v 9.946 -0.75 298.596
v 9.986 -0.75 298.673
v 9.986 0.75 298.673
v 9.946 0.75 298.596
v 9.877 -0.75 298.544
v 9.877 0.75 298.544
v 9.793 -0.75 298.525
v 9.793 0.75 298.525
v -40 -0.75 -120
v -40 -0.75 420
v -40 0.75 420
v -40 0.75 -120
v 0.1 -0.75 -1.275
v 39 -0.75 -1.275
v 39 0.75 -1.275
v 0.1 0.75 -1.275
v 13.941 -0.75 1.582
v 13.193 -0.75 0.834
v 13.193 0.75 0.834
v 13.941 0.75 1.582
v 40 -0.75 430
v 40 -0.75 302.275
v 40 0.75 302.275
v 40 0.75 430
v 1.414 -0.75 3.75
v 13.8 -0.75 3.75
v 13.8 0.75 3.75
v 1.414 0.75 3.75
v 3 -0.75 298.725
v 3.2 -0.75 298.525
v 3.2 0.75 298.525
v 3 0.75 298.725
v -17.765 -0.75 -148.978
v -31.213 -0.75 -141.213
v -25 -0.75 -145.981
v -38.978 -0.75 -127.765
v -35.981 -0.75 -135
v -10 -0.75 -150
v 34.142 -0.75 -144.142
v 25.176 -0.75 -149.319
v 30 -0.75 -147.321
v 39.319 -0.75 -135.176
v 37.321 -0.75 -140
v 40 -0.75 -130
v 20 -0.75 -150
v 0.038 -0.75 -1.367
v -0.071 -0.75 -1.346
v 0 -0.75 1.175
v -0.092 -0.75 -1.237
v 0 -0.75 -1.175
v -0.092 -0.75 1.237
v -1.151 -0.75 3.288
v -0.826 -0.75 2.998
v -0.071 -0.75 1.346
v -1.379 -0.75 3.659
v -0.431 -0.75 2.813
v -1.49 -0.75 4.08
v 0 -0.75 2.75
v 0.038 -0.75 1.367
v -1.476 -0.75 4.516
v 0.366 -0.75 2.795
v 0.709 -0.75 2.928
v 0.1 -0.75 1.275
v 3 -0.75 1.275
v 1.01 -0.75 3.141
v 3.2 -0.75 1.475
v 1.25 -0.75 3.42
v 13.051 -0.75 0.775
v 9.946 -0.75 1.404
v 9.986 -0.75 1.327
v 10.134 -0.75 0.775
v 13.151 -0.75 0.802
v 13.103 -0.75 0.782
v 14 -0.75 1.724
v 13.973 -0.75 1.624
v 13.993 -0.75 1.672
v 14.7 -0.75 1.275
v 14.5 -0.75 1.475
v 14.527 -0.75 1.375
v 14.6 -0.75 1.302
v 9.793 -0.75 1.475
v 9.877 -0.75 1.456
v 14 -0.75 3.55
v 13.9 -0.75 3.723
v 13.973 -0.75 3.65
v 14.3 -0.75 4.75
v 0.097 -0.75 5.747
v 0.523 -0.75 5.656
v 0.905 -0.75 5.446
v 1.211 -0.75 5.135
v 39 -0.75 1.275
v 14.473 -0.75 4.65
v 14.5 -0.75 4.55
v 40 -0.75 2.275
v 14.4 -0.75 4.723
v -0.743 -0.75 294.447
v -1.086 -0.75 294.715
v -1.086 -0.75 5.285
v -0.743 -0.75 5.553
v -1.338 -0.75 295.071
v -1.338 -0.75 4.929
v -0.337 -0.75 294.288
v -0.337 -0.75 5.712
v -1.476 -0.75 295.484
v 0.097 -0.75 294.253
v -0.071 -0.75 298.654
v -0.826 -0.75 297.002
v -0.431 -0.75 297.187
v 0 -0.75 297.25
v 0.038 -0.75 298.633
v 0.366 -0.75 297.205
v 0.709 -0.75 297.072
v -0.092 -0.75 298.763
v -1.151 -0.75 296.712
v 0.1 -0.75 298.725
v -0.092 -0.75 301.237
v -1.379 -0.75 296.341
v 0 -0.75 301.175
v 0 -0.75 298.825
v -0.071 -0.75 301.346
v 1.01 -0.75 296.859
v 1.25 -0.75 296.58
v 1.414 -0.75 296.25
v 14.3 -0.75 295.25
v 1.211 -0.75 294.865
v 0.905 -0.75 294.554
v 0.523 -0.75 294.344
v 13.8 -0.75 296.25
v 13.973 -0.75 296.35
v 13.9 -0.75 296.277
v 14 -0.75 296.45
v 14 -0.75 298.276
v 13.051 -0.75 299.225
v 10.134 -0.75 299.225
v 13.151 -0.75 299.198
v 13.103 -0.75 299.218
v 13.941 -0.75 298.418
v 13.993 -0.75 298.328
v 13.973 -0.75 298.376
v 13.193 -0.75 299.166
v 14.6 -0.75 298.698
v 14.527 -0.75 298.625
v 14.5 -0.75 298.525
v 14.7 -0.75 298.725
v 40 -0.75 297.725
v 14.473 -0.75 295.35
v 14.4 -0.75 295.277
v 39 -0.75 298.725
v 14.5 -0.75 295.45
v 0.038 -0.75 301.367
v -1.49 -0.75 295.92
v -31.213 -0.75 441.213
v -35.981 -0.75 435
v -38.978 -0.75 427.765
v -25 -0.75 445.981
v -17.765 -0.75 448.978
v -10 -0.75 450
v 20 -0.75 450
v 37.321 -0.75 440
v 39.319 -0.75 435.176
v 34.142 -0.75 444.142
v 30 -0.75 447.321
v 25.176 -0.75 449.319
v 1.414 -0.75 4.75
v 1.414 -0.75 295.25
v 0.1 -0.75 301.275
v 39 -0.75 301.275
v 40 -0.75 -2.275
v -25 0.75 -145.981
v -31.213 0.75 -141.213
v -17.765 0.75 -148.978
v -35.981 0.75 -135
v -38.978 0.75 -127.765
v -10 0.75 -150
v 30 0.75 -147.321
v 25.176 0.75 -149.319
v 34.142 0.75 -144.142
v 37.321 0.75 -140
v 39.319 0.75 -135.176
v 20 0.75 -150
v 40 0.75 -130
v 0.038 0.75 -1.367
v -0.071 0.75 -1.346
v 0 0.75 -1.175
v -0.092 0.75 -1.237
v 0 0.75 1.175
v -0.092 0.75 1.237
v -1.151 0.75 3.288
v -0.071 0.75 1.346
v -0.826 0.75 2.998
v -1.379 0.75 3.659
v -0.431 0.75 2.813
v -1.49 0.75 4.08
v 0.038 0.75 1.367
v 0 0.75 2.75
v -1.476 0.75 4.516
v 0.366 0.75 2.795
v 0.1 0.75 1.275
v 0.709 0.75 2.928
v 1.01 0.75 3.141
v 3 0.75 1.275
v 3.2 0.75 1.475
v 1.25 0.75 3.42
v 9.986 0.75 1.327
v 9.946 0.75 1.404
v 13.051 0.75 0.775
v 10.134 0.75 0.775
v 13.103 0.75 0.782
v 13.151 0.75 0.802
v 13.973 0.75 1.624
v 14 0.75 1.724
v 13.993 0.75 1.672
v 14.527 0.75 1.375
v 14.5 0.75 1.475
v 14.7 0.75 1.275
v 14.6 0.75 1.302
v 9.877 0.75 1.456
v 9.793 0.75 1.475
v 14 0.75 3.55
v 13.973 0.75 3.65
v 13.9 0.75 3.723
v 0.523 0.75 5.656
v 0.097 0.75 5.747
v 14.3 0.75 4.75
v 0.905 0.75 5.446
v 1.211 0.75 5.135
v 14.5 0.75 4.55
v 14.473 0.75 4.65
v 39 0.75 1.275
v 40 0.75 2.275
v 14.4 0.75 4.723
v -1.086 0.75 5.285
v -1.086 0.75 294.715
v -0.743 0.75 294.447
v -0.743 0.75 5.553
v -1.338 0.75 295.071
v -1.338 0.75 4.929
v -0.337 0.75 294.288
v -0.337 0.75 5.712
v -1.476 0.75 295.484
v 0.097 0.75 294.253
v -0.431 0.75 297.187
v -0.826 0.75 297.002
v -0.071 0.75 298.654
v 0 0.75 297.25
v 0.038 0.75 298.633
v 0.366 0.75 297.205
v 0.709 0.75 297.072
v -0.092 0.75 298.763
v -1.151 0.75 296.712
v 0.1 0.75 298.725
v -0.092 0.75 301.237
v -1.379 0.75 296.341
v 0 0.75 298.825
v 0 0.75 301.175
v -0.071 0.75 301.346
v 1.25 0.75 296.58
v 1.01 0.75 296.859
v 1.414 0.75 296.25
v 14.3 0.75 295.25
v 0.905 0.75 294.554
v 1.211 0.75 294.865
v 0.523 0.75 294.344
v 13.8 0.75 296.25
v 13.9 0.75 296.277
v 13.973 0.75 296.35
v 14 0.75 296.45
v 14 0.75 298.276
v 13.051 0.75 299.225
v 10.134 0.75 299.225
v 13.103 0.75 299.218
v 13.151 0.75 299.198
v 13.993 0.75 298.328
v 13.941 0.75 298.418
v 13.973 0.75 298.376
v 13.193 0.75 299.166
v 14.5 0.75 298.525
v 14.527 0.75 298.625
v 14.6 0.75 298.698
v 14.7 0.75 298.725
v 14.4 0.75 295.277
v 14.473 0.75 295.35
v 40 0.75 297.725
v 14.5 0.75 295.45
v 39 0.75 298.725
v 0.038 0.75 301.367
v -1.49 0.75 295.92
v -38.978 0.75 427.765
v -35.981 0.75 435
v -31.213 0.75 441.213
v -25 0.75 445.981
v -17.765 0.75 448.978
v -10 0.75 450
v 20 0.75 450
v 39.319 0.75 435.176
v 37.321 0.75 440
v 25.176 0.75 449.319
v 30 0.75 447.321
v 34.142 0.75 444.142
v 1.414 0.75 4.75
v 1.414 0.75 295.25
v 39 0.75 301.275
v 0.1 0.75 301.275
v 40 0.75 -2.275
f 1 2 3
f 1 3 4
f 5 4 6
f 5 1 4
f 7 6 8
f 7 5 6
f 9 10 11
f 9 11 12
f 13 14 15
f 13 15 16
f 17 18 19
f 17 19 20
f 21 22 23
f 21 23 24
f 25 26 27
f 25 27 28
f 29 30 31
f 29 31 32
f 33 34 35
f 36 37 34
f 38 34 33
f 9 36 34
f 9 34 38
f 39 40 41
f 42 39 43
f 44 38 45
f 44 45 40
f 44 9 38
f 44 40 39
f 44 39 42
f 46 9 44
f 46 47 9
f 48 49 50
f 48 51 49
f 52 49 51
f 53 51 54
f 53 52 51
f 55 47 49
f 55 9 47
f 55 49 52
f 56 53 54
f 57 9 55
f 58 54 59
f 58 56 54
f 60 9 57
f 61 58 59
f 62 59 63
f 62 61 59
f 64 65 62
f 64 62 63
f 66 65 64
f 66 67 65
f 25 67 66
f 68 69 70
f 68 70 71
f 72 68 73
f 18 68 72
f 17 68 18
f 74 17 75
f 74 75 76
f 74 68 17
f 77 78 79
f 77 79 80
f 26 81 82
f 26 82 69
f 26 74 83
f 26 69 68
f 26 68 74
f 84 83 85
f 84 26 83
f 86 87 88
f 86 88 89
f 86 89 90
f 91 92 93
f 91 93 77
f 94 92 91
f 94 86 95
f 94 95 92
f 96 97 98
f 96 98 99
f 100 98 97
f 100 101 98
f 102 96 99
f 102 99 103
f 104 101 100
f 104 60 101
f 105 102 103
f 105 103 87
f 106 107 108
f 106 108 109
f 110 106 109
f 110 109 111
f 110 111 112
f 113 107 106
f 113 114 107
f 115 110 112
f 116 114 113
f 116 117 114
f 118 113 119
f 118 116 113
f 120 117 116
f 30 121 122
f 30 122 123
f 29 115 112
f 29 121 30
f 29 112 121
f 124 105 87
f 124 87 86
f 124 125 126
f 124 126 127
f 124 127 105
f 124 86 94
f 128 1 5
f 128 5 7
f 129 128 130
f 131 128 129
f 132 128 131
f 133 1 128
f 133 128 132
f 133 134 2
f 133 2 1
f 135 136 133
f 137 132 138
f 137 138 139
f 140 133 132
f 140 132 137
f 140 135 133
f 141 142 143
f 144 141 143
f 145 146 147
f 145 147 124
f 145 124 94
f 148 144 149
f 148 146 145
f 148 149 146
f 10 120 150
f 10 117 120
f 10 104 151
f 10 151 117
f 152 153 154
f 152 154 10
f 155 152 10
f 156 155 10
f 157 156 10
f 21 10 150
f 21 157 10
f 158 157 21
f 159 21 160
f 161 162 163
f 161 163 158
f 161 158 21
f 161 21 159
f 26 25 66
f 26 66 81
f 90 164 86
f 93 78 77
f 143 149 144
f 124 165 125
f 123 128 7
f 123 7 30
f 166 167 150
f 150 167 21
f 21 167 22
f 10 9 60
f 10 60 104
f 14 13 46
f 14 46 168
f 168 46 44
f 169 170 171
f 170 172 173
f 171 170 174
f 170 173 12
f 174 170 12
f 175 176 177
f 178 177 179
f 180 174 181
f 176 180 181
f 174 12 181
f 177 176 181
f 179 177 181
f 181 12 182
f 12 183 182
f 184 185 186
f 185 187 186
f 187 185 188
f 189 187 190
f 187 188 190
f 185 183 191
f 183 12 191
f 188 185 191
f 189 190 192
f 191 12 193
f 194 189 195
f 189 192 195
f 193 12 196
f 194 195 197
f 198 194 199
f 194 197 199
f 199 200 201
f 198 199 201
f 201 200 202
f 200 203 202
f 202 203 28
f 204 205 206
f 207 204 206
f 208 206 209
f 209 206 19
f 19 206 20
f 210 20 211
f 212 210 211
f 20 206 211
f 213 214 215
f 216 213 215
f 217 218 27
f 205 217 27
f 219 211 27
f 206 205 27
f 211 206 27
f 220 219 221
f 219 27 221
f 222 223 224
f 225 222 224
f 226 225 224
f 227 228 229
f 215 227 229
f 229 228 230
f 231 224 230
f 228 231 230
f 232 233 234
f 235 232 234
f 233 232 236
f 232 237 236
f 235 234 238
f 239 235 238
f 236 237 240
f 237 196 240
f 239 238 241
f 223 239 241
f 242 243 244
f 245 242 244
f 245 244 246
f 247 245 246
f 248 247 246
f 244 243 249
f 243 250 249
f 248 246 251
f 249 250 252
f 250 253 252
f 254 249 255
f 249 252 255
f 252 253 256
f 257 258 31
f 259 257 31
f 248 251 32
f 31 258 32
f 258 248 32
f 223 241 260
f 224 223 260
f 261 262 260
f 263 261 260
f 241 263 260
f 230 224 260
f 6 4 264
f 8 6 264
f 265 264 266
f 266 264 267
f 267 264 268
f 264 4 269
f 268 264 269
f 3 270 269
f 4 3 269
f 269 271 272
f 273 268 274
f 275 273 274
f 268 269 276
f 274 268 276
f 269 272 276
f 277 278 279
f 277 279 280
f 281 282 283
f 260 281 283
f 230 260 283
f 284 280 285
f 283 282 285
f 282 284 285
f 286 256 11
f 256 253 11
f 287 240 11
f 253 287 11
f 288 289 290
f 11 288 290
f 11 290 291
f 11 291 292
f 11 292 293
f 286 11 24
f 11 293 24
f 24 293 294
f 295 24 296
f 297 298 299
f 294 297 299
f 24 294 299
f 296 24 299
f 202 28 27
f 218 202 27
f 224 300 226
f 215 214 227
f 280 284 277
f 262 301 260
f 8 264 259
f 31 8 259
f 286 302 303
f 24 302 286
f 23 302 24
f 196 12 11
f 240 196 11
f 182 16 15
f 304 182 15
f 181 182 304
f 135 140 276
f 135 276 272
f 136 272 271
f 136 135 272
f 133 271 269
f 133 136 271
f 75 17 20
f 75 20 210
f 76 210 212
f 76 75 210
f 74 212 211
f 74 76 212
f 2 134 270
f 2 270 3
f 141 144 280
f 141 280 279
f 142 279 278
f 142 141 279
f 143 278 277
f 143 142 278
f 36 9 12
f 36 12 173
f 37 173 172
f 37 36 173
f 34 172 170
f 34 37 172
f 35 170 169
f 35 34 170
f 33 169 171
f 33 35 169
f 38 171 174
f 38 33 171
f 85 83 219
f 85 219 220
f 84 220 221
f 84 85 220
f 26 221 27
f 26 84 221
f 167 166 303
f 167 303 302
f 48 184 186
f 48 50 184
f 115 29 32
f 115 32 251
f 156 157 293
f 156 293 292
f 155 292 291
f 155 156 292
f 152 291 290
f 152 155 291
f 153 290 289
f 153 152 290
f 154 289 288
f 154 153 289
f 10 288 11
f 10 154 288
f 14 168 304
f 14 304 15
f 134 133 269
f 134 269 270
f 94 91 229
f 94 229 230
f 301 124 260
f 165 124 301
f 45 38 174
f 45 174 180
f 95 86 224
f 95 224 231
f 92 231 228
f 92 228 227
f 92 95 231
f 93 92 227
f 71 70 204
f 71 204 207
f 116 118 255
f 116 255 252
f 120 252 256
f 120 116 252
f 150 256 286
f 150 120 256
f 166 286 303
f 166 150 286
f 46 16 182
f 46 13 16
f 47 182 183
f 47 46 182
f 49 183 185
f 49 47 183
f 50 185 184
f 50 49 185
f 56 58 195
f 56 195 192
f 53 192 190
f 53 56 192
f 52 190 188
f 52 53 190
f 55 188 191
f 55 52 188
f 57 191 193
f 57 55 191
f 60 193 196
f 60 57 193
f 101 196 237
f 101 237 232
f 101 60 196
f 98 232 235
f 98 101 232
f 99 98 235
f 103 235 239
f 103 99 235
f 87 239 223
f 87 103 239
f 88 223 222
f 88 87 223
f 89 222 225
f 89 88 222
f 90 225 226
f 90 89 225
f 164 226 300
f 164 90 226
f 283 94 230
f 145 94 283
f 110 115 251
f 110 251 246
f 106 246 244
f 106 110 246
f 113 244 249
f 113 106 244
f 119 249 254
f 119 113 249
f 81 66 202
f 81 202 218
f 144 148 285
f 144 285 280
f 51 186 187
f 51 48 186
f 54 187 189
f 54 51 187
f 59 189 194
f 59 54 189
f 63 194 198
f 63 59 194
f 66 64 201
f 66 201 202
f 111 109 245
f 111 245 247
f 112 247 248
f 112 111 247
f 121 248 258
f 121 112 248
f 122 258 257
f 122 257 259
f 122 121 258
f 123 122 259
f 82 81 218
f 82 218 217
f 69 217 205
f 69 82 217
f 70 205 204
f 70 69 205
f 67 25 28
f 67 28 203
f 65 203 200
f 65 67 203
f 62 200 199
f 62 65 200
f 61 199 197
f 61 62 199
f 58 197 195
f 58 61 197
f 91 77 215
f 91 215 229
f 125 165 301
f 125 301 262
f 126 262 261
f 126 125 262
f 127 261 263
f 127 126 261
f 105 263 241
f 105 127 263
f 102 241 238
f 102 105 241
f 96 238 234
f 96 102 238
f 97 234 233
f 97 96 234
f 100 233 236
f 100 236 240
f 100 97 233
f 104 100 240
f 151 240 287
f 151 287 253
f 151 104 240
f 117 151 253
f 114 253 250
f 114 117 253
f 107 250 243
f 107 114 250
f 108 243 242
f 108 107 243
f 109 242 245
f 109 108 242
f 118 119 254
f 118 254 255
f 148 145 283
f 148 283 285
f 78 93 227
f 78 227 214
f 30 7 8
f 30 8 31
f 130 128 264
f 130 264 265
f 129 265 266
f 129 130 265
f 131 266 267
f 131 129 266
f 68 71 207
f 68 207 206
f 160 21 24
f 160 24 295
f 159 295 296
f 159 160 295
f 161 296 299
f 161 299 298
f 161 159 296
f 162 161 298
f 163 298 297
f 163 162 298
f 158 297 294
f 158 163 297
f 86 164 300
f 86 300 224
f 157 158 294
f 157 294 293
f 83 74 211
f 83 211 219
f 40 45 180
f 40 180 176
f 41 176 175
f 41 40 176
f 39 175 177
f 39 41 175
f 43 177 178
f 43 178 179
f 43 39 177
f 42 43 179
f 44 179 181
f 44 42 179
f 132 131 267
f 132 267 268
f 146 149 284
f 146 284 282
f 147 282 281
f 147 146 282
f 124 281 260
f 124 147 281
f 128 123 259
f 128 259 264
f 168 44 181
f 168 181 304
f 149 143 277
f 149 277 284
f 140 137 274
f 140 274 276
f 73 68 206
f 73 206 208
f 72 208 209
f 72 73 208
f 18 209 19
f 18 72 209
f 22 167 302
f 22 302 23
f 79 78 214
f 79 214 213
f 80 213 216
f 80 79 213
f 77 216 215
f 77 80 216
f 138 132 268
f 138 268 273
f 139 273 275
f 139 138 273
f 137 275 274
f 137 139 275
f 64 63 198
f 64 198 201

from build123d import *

# Parameters (mm, degrees)
F1_DEPTH      = 0.75
F1_DEPTH_BACK = 0.75


with BuildPart() as f1:
    # F0 (on Front) → F1 (new body, two sides)
    with BuildSketch(Plane.XZ) as f1_sk:
        with BuildLine():
            ThreePointArc((0, 1.175), (-0.070711, 1.345711), (0.1, 1.275))
            Line((0.1, 1.275), (3, 1.275))
            Line((3, 1.275), (3.2, 1.475))
            Line((3.2, 1.475), (9.792945, 1.475))
            ThreePointArc((9.792945, 1.475), (9.914697, 1.433671), (9.98613, 1.326764))
            Line((9.98613, 1.326764), (10.133975, 0.775))
            Line((10.133975, 0.775), (13.051132, 0.775))
            ThreePointArc((13.051132, 0.775), (13.127669, 0.790224), (13.192553, 0.833579))
            Line((13.192553, 0.833579), (13.941421, 1.582447))
            ThreePointArc((13.941421, 1.582447), (13.984776, 1.647331), (14, 1.723868))
            Line((14, 1.723868), (14, 3.55))
            ThreePointArc((14, 3.55), (13.941421, 3.691421), (13.8, 3.75))
            Line((13.8, 3.75), (1.414214, 3.75))
            ThreePointArc((1.414214, 3.75), (0.866025, 3.025255), (0, 2.75))
            ThreePointArc((0, 2.75), (-1.224745, 5.116025), (1.414214, 4.75))
            Line((1.414214, 4.75), (14.3, 4.75))
            ThreePointArc((14.3, 4.75), (14.441421, 4.691421), (14.5, 4.55))
            Line((14.5, 4.55), (14.5, 1.475))
            ThreePointArc((14.5, 1.475), (14.558579, 1.333579), (14.7, 1.275))
            Line((14.7, 1.275), (39, 1.275))
            Line((39, 1.275), (40, 2.275))
            Line((40, 2.275), (40, 150))
            Line((40, 150), (40, 297.725))
            Line((40, 297.725), (39, 298.725))
            Line((39, 298.725), (14.7, 298.725))
            ThreePointArc((14.7, 298.725), (14.558579, 298.666421), (14.5, 298.525))
            Line((14.5, 298.525), (14.5, 295.45))
            ThreePointArc((14.5, 295.45), (14.441421, 295.308579), (14.3, 295.25))
            Line((14.3, 295.25), (1.414214, 295.25))
            ThreePointArc((1.414214, 295.25), (-1.224745, 294.883975), (0, 297.25))
            ThreePointArc((0, 297.25), (0.866025, 296.974745), (1.414214, 296.25))
            Line((1.414214, 296.25), (13.8, 296.25))
            ThreePointArc((13.8, 296.25), (13.941421, 296.308579), (14, 296.45))
            Line((14, 296.45), (14, 298.276132))
            ThreePointArc((14, 298.276132), (13.984776, 298.352669), (13.941421, 298.417553))
            Line((13.941421, 298.417553), (13.192553, 299.166421))
            ThreePointArc((13.192553, 299.166421), (13.127669, 299.209776), (13.051132, 299.225))
            Line((13.051132, 299.225), (10.133975, 299.225))
            Line((10.133975, 299.225), (9.98613, 298.673236))
            ThreePointArc((9.98613, 298.673236), (9.914697, 298.566329), (9.792945, 298.525))
            Line((9.792945, 298.525), (3.2, 298.525))
            Line((3.2, 298.525), (3, 298.725))
            Line((3, 298.725), (0.1, 298.725))
            ThreePointArc((0.1, 298.725), (-0.070711, 298.654289), (0, 298.825))
            Line((0, 298.825), (0, 300))
            Line((0, 300), (0, 301.175))
            ThreePointArc((0, 301.175), (-0.070711, 301.345711), (0.1, 301.275))
            Line((0.1, 301.275), (14.7, 301.275))
            Line((14.7, 301.275), (39, 301.275))
            Line((39, 301.275), (40, 302.275))
            Line((40, 302.275), (40, 430))
            ThreePointArc((40, 430), (34.142136, 444.142136), (20, 450))
            Line((20, 450), (-10, 450))
            ThreePointArc((-10, 450), (-31.213203, 441.213203), (-40, 420))
            Line((-40, 420), (-40, -120))
            ThreePointArc((-40, -120), (-31.213203, -141.213203), (-10, -150))
            Line((-10, -150), (20, -150))
            ThreePointArc((20, -150), (34.142136, -144.142136), (40, -130))
            Line((40, -130), (40, -2.275))
            Line((40, -2.275), (39, -1.275))
            Line((39, -1.275), (14.7, -1.275))
            Line((14.7, -1.275), (0.1, -1.275))
            ThreePointArc((0.1, -1.275), (-0.070711, -1.345711), (0, -1.175))
            Line((0, -1.175), (0, 0))
            Line((0, 0), (0, 1.175))
        make_face()
    extrude(amount=F1_DEPTH)
    extrude(f1_sk.sketch, amount=-F1_DEPTH_BACK)


solid = f1.part
